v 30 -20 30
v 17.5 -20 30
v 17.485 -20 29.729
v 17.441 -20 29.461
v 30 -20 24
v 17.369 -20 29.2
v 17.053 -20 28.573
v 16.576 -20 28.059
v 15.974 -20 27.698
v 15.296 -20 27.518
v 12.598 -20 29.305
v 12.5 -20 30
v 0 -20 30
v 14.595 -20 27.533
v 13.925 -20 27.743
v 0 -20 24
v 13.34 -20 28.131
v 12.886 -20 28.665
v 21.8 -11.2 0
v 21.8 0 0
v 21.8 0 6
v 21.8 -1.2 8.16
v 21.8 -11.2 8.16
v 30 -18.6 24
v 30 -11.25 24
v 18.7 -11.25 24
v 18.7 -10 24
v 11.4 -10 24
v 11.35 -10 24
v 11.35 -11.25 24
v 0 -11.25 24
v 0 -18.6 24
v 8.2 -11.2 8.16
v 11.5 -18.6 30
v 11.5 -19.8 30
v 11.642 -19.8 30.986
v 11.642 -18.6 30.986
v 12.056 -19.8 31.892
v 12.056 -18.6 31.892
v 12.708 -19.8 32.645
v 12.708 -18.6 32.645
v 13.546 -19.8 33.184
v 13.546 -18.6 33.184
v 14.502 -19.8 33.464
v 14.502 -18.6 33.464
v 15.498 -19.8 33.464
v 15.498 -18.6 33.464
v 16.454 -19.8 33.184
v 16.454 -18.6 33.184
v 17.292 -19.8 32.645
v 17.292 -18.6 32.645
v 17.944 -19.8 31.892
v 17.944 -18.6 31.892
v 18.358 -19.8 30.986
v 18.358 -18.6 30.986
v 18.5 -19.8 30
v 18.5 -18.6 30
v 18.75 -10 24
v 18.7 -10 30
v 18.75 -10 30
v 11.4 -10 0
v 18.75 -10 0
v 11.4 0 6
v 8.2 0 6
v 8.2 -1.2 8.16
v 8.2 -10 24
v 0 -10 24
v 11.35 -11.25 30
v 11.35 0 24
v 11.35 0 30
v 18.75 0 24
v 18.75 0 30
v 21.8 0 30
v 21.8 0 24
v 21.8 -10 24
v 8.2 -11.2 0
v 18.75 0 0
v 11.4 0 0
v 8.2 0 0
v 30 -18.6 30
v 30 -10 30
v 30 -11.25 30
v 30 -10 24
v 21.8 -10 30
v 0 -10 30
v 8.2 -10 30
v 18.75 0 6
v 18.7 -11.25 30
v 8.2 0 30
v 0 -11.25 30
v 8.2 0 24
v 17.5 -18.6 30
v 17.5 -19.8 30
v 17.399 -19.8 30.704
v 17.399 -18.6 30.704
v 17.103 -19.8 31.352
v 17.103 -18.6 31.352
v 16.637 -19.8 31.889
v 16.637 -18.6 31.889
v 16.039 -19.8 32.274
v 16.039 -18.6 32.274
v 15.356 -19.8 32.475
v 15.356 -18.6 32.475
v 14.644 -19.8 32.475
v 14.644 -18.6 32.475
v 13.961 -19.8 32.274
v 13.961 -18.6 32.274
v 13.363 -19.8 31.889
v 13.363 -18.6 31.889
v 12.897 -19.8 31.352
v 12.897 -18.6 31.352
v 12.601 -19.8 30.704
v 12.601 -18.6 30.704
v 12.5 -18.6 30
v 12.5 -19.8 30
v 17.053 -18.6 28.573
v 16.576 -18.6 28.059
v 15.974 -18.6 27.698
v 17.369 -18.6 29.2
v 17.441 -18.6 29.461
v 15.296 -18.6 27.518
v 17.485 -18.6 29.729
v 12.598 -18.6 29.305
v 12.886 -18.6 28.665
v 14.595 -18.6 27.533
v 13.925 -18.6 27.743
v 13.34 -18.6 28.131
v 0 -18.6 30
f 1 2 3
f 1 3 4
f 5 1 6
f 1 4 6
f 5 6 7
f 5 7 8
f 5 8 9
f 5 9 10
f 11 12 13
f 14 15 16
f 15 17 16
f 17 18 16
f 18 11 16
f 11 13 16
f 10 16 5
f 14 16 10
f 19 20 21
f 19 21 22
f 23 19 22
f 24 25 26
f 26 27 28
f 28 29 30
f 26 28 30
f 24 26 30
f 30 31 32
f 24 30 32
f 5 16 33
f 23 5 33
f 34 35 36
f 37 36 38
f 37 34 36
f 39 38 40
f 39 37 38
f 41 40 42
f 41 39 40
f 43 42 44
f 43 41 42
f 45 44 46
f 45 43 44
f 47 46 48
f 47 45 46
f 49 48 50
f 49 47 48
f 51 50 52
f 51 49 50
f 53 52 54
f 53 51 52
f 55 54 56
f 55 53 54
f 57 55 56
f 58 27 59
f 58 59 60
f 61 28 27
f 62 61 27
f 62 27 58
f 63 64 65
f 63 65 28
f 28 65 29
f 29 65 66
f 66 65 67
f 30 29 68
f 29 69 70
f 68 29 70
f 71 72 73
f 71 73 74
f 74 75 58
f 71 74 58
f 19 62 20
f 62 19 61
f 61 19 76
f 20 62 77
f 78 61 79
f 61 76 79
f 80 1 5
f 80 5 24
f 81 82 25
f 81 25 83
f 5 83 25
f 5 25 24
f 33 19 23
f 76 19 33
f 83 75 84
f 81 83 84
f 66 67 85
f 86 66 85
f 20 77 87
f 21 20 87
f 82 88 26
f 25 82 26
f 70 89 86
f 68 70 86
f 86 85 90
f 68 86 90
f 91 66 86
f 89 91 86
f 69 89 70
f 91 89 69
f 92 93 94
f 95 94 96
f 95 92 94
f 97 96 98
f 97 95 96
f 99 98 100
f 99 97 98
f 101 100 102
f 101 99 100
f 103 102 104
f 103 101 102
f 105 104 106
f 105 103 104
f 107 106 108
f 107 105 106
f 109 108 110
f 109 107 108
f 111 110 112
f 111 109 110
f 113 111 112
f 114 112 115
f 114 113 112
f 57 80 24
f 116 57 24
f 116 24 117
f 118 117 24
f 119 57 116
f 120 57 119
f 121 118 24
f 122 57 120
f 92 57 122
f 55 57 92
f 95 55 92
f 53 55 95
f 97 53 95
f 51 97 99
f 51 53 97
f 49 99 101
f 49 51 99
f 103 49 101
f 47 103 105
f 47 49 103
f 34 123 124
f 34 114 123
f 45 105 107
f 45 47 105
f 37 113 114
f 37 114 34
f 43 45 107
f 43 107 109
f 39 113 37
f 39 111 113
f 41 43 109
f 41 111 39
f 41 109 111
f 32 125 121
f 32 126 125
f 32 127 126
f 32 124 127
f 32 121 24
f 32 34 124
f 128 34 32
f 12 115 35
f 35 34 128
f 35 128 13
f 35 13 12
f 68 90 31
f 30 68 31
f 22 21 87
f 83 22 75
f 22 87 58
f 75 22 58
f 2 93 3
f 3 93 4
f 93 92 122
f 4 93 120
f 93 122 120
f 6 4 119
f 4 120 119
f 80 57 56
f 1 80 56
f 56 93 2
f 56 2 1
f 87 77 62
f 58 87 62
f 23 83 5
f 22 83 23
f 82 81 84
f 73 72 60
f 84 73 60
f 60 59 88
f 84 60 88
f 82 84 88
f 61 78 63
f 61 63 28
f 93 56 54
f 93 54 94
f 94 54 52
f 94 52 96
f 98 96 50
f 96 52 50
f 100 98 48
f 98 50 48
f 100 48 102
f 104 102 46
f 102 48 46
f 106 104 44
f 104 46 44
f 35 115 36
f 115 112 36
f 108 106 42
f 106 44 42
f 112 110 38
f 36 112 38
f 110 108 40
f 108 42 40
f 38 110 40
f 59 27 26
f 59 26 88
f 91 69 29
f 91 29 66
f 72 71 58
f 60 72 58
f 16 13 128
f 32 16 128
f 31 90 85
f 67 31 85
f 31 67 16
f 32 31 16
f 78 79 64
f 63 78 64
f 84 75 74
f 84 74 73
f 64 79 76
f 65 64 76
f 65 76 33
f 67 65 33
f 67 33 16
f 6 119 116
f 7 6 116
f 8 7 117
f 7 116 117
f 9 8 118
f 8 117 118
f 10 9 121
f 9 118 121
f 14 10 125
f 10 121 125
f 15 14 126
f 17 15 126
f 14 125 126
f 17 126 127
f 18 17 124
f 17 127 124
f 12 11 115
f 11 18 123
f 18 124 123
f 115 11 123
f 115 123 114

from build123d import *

# Parameters (mm, degrees)
F0_W      = 7.6
F0_H      = 6
F1_DEPTH  = 30
F2_W      = 10.2
F2_H      = 1.2
F2_W_2    = 7.35
F2_W_3    = 10.05
F2_W_4    = 1.2
F3_DEPTH  = 10
F4_W      = 3.1
F4_H      = 6
F4_W_2    = 3.15
F5_DEPTH  = 25
F4_W_3    = 7.35
F6_DEPTH  = 3
F2_H_2    = 10
F7_DEPTH  = 30.8
F8_DEPTH  = 25
F9_W      = 8.2
F9_H      = 8.16
F10_DEPTH = 25
F12_DEPTH = 25
F14_DEPTH = 25
F15_DEPTH = 1.2


with BuildPart() as f1:
    # F0 (on Right) → F1 (new body)
    with BuildSketch(Plane.YZ):
        Polygon((-18.5999230509, 30.0000671301), (-19.9999230509, 30.0000671301), (-19.9999230509, 24.0000671301), (-9.9999230509, 6.0000671301), (-9.9999230509, 6.71301e-05), (-8.7999230509, 6.71301e-05), (-8.7999230509, 6.0000671301), (-18.5999230509, 24.0000671301), align=None)
        Polygon((-11.2499230509, 24.0000671301), (-18.5999230509, 24.0000671301), (-8.7999230509, 6.0000671301), (-1.1999230509, 6.0000671301), align=None)
        Polygon((-9.9999230509, 30.0000671301), (-11.2499230509, 30.0000671301), (-11.2499230509, 24.0000671301), (-1.1999230509, 6.0000671301), (-1.1999230509, 6.71301e-05), (7.69491e-05, 6.71301e-05), (7.69491e-05, 6.0000671301), (-9.9999230509, 24.0000671301), align=None)
        with Locations((-4.9999230509, 3.0000671301)):
            Rectangle(F0_W, F0_H)
    extrude(amount=F1_DEPTH)

    # F2 (on face) → F3 (join)
    with BuildSketch(Plane(origin=(0, 0, 6.71301e-05), x_dir=(1, 0, 0), z_dir=(0, 0, -1))):
        with Locations((5.1, 10.5999230509)):
            Rectangle(F2_W, F2_H)
        with Locations((15.075, 10.5999230509)):
            Rectangle(F2_W_2, F2_H)
        with Locations((24.975, 10.5999230509)):
            Rectangle(F2_W_3, F2_H)
        with Locations((10.8, 10.5999230509)):
            Rectangle(F2_W_4, F2_H)
        with Locations((19.35, 10.5999230509)):
            Rectangle(F2_W_4, F2_H)
    extrude(amount=-F3_DEPTH)

    # F4 (on face) → F5 (join)
    with BuildSketch(Plane(origin=(0, -9.9999230509, 0), x_dir=(-1, 0, 0), z_dir=(0, 1, 0))):
        with Locations((-20.25, 27.0000671301)):
            Rectangle(F4_W, F4_H)
        with Locations((-9.775, 27.0000671301)):
            Rectangle(F4_W_2, F4_H)
    extrude(amount=F5_DEPTH)

    # F4 (on face) → F6 (cut)
    with BuildSketch(Plane(origin=(0, -9.9999230509, 0), x_dir=(-1, 0, 0), z_dir=(0, 1, 0))):
        with Locations((-15.025, 27.0000671301)):
            Rectangle(F4_W_3, F4_H)
    extrude(amount=-F6_DEPTH, mode=Mode.SUBTRACT)

    # F2 (on face) → F7 (cut)
    with BuildSketch(Plane(origin=(0, 0, 6.71301e-05), x_dir=(1, 0, 0), z_dir=(0, 0, -1))):
        with Locations((15.075, 4.9999230509)):
            Rectangle(F2_W_2, F2_H_2)
    extrude(amount=-F7_DEPTH, mode=Mode.SUBTRACT)

    # F0 (on Right) → F8 (cut)
    with BuildSketch(Plane.YZ):
        Polygon((7.69491e-05, 51.0639390725), (7.69491e-05, 30.0000671301), (7.69491e-05, 6.0000671301), (43.8302202369, 6.0000671301), (43.8302202369, 51.0639390725), align=None)
    extrude(amount=F8_DEPTH, mode=Mode.SUBTRACT)

    # F9 (on face) → F10 (cut)
    with BuildSketch(Plane.XZ.offset(11.1999230509)):
        with Locations((4.1, 4.0800671301)):
            Rectangle(F9_W, F9_H)
        with Locations((25.9, 4.0800671301)):
            Rectangle(F9_W, F9_H)
    extrude(amount=-F10_DEPTH, mode=Mode.SUBTRACT)

    # F11 (on Front) → F12 (cut)
    with BuildSketch(Plane.XZ):
        Polygon((0, 24), (0, 8.16), (8.2, 8.16), align=None)
        Polygon((30, 24), (21.8, 8.16), (30, 8.16), align=None)
    extrude(amount=F12_DEPTH, mode=Mode.SUBTRACT)

    # F13 (on face) → F14 (cut)
    with BuildSketch(Plane(origin=(0, -18.5999230509, 0), x_dir=(-1, 0, 0), z_dir=(0, 1, 0))):
        with BuildLine():
            ThreePointArc((-17.5, 30.0000671301), (-17.466917068, 29.5947028748), (-17.3685438565, 29.2000671301))
            ThreePointArc((-17.3685438565, 29.2000671301), (-14.5946357448, 27.533150062), (-12.5, 30.0000671301))
            Line((-12.5, 30.0000671301), (-17.5, 30.0000671301))
        make_face()
    extrude(amount=-F14_DEPTH, mode=Mode.SUBTRACT)

    # F13 (on face) → F15 (join)
    with BuildSketch(Plane(origin=(0, -18.5999230509, 0), x_dir=(-1, 0, 0), z_dir=(0, 1, 0))):
        with BuildLine():
            ThreePointArc((-11.5, 30.0000671301), (-15.4026738592, 33.4768262191), (-18.4073450075, 29.2000671301))
            ThreePointArc((-18.4073450075, 29.2000671301), (-14.5973261408, 26.523308041), (-11.5, 30.0000671301))
        make_face()
        with BuildLine():
            ThreePointArc((-12.5, 30.0000671301), (-14.5946357448, 27.533150062), (-17.3685438565, 29.2000671301))
            ThreePointArc((-17.3685438565, 29.2000671301), (-15.4053642552, 32.4669841981), (-12.5, 30.0000671301))
        make_face(mode=Mode.SUBTRACT)
    extrude(amount=-F15_DEPTH)


solid = f1.part
